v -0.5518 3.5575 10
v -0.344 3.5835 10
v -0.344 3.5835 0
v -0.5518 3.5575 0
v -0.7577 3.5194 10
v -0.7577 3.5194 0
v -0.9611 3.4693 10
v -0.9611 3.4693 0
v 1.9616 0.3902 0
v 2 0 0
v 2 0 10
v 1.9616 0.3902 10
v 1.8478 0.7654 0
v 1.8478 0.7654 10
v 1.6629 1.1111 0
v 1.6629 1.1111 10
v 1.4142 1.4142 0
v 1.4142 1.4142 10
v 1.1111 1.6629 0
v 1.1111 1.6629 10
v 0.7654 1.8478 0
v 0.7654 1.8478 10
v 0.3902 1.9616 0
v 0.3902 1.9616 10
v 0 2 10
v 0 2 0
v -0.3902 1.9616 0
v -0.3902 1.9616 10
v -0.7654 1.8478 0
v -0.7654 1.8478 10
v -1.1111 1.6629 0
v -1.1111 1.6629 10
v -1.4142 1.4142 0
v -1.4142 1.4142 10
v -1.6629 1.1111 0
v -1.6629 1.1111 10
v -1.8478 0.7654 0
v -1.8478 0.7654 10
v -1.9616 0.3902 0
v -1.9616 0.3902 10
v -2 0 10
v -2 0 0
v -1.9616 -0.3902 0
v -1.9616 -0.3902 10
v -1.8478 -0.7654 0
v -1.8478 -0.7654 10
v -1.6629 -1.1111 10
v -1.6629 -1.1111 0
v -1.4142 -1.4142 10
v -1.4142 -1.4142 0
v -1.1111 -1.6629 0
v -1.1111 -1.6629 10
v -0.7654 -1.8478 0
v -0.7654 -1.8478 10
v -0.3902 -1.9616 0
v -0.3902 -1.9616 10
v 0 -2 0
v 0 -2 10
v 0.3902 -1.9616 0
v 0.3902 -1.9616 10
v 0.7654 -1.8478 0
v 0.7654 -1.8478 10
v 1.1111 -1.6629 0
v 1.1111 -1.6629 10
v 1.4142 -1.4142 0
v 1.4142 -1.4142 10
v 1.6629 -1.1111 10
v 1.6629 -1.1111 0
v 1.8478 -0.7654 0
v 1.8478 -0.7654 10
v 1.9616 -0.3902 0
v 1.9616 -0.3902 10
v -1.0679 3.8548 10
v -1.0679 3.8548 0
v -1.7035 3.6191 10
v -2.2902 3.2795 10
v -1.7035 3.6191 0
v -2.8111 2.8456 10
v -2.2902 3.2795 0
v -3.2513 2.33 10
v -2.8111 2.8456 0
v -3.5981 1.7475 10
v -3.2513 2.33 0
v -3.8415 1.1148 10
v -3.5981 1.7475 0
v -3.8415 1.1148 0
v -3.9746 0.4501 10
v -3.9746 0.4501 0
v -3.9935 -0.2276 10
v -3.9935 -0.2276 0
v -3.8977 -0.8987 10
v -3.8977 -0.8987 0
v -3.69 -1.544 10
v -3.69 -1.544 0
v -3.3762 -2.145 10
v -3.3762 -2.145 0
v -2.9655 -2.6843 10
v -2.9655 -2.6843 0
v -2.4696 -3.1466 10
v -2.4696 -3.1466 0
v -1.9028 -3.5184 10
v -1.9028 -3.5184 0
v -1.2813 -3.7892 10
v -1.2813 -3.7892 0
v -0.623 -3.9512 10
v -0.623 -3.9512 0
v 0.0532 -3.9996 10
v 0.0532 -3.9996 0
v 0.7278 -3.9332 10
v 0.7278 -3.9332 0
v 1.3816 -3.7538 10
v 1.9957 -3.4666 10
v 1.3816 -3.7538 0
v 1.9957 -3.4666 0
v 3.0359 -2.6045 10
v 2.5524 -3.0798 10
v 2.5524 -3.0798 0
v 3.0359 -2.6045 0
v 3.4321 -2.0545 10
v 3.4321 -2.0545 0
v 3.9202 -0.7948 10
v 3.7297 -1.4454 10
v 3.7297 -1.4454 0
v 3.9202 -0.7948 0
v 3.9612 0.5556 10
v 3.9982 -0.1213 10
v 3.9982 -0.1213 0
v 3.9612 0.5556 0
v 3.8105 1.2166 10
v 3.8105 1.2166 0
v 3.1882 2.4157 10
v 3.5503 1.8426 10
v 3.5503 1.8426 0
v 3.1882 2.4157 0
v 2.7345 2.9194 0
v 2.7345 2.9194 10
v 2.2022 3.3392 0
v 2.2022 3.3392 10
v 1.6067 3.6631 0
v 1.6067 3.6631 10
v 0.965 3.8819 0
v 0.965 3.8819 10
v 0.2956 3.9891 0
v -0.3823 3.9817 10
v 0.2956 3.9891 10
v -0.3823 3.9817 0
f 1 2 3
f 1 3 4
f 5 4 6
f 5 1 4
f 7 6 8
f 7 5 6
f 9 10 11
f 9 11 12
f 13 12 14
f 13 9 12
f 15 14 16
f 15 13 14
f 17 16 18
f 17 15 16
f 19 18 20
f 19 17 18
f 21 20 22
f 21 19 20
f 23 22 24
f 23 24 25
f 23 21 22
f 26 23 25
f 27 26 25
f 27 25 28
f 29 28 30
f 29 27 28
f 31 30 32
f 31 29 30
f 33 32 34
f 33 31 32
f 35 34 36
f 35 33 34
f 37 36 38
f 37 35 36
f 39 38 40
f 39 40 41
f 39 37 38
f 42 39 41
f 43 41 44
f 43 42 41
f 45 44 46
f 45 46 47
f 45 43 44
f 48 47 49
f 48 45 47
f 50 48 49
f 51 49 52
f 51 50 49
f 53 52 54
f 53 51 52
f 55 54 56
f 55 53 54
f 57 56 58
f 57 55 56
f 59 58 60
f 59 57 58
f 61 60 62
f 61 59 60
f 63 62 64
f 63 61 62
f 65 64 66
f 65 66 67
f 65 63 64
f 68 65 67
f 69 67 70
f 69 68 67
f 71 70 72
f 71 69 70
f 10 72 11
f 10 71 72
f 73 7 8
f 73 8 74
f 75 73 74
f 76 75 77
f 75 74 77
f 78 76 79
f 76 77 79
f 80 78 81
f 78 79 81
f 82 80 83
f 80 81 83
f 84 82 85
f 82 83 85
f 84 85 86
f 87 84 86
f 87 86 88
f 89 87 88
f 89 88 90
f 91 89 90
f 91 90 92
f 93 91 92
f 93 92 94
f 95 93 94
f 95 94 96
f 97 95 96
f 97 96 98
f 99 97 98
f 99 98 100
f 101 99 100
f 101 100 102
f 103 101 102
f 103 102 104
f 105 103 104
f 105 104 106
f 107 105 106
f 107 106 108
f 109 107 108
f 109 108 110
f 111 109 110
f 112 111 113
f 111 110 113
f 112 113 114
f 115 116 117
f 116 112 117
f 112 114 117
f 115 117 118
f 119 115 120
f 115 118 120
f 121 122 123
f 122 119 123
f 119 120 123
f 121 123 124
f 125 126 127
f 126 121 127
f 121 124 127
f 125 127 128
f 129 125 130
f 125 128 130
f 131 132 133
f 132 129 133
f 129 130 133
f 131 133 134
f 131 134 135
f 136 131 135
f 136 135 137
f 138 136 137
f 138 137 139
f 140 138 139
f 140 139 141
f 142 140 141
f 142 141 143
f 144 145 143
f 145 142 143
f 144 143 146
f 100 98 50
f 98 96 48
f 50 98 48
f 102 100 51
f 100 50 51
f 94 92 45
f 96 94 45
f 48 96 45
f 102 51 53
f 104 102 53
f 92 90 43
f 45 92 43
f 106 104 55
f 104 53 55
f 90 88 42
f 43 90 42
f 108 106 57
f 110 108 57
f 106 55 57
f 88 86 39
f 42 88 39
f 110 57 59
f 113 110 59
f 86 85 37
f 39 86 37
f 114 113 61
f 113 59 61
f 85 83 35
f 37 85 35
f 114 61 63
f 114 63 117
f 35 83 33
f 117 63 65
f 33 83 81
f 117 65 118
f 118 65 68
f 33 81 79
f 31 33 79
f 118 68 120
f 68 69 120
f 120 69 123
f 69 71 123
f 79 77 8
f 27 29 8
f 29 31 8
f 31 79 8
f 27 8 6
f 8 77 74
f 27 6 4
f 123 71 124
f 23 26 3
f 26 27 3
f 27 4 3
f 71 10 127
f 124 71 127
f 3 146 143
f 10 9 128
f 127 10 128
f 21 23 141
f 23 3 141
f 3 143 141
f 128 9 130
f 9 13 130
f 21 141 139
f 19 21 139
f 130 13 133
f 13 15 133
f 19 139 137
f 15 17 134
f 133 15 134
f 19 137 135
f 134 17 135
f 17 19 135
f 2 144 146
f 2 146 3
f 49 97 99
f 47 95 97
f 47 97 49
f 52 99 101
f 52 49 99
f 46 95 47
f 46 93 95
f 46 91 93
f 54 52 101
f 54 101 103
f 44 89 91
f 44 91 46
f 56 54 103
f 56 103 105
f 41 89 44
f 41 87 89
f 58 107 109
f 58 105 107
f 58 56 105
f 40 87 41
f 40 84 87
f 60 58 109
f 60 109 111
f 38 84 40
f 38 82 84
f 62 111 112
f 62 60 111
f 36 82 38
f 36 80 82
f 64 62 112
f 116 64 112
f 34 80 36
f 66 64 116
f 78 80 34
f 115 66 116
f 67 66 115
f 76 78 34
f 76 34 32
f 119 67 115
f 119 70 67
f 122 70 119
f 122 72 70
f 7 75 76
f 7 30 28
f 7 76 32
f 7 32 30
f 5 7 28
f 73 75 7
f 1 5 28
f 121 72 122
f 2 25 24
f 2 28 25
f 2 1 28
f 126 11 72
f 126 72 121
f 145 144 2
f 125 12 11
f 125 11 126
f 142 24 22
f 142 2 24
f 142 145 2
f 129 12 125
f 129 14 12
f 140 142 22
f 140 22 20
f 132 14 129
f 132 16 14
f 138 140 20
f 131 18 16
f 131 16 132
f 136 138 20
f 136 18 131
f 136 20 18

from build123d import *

# Parameters (mm, degrees)
SKETCH1_R           = 4
SKETCH1_R_2         = 2
BOSS_EXTRUDE1_DEPTH = 10
CUT_EXTRUDE1_DEPTH  = 11


with BuildPart() as part:
    # Sketch1 → Boss-Extrude1 (new body)
    with BuildSketch(Plane.XY):
        Circle(SKETCH1_R)
        Circle(SKETCH1_R_2, mode=Mode.SUBTRACT)
    extrude(amount=BOSS_EXTRUDE1_DEPTH)

    # Sketch2 → Cut-Extrude1 (cut)
    with BuildSketch(Plane.XY.offset(10)):
        with BuildLine():
            Line((-0.961093553, 3.469336995), (-1.43156592, 5.16763908))
            ThreePointArc((-1.43156592, 5.16763908), (-0.975728957, 5.272743844), (-0.512466108, 5.337719844))
            Line((-0.512466108, 5.337719844), (-0.344048336, 3.583522114))
            ThreePointArc((-0.344048336, 3.583522114), (-0.65506366, 3.539899942), (-0.961093553, 3.469336995))
        make_face()
    extrude(amount=-CUT_EXTRUDE1_DEPTH, mode=Mode.SUBTRACT)


solid = part.part
